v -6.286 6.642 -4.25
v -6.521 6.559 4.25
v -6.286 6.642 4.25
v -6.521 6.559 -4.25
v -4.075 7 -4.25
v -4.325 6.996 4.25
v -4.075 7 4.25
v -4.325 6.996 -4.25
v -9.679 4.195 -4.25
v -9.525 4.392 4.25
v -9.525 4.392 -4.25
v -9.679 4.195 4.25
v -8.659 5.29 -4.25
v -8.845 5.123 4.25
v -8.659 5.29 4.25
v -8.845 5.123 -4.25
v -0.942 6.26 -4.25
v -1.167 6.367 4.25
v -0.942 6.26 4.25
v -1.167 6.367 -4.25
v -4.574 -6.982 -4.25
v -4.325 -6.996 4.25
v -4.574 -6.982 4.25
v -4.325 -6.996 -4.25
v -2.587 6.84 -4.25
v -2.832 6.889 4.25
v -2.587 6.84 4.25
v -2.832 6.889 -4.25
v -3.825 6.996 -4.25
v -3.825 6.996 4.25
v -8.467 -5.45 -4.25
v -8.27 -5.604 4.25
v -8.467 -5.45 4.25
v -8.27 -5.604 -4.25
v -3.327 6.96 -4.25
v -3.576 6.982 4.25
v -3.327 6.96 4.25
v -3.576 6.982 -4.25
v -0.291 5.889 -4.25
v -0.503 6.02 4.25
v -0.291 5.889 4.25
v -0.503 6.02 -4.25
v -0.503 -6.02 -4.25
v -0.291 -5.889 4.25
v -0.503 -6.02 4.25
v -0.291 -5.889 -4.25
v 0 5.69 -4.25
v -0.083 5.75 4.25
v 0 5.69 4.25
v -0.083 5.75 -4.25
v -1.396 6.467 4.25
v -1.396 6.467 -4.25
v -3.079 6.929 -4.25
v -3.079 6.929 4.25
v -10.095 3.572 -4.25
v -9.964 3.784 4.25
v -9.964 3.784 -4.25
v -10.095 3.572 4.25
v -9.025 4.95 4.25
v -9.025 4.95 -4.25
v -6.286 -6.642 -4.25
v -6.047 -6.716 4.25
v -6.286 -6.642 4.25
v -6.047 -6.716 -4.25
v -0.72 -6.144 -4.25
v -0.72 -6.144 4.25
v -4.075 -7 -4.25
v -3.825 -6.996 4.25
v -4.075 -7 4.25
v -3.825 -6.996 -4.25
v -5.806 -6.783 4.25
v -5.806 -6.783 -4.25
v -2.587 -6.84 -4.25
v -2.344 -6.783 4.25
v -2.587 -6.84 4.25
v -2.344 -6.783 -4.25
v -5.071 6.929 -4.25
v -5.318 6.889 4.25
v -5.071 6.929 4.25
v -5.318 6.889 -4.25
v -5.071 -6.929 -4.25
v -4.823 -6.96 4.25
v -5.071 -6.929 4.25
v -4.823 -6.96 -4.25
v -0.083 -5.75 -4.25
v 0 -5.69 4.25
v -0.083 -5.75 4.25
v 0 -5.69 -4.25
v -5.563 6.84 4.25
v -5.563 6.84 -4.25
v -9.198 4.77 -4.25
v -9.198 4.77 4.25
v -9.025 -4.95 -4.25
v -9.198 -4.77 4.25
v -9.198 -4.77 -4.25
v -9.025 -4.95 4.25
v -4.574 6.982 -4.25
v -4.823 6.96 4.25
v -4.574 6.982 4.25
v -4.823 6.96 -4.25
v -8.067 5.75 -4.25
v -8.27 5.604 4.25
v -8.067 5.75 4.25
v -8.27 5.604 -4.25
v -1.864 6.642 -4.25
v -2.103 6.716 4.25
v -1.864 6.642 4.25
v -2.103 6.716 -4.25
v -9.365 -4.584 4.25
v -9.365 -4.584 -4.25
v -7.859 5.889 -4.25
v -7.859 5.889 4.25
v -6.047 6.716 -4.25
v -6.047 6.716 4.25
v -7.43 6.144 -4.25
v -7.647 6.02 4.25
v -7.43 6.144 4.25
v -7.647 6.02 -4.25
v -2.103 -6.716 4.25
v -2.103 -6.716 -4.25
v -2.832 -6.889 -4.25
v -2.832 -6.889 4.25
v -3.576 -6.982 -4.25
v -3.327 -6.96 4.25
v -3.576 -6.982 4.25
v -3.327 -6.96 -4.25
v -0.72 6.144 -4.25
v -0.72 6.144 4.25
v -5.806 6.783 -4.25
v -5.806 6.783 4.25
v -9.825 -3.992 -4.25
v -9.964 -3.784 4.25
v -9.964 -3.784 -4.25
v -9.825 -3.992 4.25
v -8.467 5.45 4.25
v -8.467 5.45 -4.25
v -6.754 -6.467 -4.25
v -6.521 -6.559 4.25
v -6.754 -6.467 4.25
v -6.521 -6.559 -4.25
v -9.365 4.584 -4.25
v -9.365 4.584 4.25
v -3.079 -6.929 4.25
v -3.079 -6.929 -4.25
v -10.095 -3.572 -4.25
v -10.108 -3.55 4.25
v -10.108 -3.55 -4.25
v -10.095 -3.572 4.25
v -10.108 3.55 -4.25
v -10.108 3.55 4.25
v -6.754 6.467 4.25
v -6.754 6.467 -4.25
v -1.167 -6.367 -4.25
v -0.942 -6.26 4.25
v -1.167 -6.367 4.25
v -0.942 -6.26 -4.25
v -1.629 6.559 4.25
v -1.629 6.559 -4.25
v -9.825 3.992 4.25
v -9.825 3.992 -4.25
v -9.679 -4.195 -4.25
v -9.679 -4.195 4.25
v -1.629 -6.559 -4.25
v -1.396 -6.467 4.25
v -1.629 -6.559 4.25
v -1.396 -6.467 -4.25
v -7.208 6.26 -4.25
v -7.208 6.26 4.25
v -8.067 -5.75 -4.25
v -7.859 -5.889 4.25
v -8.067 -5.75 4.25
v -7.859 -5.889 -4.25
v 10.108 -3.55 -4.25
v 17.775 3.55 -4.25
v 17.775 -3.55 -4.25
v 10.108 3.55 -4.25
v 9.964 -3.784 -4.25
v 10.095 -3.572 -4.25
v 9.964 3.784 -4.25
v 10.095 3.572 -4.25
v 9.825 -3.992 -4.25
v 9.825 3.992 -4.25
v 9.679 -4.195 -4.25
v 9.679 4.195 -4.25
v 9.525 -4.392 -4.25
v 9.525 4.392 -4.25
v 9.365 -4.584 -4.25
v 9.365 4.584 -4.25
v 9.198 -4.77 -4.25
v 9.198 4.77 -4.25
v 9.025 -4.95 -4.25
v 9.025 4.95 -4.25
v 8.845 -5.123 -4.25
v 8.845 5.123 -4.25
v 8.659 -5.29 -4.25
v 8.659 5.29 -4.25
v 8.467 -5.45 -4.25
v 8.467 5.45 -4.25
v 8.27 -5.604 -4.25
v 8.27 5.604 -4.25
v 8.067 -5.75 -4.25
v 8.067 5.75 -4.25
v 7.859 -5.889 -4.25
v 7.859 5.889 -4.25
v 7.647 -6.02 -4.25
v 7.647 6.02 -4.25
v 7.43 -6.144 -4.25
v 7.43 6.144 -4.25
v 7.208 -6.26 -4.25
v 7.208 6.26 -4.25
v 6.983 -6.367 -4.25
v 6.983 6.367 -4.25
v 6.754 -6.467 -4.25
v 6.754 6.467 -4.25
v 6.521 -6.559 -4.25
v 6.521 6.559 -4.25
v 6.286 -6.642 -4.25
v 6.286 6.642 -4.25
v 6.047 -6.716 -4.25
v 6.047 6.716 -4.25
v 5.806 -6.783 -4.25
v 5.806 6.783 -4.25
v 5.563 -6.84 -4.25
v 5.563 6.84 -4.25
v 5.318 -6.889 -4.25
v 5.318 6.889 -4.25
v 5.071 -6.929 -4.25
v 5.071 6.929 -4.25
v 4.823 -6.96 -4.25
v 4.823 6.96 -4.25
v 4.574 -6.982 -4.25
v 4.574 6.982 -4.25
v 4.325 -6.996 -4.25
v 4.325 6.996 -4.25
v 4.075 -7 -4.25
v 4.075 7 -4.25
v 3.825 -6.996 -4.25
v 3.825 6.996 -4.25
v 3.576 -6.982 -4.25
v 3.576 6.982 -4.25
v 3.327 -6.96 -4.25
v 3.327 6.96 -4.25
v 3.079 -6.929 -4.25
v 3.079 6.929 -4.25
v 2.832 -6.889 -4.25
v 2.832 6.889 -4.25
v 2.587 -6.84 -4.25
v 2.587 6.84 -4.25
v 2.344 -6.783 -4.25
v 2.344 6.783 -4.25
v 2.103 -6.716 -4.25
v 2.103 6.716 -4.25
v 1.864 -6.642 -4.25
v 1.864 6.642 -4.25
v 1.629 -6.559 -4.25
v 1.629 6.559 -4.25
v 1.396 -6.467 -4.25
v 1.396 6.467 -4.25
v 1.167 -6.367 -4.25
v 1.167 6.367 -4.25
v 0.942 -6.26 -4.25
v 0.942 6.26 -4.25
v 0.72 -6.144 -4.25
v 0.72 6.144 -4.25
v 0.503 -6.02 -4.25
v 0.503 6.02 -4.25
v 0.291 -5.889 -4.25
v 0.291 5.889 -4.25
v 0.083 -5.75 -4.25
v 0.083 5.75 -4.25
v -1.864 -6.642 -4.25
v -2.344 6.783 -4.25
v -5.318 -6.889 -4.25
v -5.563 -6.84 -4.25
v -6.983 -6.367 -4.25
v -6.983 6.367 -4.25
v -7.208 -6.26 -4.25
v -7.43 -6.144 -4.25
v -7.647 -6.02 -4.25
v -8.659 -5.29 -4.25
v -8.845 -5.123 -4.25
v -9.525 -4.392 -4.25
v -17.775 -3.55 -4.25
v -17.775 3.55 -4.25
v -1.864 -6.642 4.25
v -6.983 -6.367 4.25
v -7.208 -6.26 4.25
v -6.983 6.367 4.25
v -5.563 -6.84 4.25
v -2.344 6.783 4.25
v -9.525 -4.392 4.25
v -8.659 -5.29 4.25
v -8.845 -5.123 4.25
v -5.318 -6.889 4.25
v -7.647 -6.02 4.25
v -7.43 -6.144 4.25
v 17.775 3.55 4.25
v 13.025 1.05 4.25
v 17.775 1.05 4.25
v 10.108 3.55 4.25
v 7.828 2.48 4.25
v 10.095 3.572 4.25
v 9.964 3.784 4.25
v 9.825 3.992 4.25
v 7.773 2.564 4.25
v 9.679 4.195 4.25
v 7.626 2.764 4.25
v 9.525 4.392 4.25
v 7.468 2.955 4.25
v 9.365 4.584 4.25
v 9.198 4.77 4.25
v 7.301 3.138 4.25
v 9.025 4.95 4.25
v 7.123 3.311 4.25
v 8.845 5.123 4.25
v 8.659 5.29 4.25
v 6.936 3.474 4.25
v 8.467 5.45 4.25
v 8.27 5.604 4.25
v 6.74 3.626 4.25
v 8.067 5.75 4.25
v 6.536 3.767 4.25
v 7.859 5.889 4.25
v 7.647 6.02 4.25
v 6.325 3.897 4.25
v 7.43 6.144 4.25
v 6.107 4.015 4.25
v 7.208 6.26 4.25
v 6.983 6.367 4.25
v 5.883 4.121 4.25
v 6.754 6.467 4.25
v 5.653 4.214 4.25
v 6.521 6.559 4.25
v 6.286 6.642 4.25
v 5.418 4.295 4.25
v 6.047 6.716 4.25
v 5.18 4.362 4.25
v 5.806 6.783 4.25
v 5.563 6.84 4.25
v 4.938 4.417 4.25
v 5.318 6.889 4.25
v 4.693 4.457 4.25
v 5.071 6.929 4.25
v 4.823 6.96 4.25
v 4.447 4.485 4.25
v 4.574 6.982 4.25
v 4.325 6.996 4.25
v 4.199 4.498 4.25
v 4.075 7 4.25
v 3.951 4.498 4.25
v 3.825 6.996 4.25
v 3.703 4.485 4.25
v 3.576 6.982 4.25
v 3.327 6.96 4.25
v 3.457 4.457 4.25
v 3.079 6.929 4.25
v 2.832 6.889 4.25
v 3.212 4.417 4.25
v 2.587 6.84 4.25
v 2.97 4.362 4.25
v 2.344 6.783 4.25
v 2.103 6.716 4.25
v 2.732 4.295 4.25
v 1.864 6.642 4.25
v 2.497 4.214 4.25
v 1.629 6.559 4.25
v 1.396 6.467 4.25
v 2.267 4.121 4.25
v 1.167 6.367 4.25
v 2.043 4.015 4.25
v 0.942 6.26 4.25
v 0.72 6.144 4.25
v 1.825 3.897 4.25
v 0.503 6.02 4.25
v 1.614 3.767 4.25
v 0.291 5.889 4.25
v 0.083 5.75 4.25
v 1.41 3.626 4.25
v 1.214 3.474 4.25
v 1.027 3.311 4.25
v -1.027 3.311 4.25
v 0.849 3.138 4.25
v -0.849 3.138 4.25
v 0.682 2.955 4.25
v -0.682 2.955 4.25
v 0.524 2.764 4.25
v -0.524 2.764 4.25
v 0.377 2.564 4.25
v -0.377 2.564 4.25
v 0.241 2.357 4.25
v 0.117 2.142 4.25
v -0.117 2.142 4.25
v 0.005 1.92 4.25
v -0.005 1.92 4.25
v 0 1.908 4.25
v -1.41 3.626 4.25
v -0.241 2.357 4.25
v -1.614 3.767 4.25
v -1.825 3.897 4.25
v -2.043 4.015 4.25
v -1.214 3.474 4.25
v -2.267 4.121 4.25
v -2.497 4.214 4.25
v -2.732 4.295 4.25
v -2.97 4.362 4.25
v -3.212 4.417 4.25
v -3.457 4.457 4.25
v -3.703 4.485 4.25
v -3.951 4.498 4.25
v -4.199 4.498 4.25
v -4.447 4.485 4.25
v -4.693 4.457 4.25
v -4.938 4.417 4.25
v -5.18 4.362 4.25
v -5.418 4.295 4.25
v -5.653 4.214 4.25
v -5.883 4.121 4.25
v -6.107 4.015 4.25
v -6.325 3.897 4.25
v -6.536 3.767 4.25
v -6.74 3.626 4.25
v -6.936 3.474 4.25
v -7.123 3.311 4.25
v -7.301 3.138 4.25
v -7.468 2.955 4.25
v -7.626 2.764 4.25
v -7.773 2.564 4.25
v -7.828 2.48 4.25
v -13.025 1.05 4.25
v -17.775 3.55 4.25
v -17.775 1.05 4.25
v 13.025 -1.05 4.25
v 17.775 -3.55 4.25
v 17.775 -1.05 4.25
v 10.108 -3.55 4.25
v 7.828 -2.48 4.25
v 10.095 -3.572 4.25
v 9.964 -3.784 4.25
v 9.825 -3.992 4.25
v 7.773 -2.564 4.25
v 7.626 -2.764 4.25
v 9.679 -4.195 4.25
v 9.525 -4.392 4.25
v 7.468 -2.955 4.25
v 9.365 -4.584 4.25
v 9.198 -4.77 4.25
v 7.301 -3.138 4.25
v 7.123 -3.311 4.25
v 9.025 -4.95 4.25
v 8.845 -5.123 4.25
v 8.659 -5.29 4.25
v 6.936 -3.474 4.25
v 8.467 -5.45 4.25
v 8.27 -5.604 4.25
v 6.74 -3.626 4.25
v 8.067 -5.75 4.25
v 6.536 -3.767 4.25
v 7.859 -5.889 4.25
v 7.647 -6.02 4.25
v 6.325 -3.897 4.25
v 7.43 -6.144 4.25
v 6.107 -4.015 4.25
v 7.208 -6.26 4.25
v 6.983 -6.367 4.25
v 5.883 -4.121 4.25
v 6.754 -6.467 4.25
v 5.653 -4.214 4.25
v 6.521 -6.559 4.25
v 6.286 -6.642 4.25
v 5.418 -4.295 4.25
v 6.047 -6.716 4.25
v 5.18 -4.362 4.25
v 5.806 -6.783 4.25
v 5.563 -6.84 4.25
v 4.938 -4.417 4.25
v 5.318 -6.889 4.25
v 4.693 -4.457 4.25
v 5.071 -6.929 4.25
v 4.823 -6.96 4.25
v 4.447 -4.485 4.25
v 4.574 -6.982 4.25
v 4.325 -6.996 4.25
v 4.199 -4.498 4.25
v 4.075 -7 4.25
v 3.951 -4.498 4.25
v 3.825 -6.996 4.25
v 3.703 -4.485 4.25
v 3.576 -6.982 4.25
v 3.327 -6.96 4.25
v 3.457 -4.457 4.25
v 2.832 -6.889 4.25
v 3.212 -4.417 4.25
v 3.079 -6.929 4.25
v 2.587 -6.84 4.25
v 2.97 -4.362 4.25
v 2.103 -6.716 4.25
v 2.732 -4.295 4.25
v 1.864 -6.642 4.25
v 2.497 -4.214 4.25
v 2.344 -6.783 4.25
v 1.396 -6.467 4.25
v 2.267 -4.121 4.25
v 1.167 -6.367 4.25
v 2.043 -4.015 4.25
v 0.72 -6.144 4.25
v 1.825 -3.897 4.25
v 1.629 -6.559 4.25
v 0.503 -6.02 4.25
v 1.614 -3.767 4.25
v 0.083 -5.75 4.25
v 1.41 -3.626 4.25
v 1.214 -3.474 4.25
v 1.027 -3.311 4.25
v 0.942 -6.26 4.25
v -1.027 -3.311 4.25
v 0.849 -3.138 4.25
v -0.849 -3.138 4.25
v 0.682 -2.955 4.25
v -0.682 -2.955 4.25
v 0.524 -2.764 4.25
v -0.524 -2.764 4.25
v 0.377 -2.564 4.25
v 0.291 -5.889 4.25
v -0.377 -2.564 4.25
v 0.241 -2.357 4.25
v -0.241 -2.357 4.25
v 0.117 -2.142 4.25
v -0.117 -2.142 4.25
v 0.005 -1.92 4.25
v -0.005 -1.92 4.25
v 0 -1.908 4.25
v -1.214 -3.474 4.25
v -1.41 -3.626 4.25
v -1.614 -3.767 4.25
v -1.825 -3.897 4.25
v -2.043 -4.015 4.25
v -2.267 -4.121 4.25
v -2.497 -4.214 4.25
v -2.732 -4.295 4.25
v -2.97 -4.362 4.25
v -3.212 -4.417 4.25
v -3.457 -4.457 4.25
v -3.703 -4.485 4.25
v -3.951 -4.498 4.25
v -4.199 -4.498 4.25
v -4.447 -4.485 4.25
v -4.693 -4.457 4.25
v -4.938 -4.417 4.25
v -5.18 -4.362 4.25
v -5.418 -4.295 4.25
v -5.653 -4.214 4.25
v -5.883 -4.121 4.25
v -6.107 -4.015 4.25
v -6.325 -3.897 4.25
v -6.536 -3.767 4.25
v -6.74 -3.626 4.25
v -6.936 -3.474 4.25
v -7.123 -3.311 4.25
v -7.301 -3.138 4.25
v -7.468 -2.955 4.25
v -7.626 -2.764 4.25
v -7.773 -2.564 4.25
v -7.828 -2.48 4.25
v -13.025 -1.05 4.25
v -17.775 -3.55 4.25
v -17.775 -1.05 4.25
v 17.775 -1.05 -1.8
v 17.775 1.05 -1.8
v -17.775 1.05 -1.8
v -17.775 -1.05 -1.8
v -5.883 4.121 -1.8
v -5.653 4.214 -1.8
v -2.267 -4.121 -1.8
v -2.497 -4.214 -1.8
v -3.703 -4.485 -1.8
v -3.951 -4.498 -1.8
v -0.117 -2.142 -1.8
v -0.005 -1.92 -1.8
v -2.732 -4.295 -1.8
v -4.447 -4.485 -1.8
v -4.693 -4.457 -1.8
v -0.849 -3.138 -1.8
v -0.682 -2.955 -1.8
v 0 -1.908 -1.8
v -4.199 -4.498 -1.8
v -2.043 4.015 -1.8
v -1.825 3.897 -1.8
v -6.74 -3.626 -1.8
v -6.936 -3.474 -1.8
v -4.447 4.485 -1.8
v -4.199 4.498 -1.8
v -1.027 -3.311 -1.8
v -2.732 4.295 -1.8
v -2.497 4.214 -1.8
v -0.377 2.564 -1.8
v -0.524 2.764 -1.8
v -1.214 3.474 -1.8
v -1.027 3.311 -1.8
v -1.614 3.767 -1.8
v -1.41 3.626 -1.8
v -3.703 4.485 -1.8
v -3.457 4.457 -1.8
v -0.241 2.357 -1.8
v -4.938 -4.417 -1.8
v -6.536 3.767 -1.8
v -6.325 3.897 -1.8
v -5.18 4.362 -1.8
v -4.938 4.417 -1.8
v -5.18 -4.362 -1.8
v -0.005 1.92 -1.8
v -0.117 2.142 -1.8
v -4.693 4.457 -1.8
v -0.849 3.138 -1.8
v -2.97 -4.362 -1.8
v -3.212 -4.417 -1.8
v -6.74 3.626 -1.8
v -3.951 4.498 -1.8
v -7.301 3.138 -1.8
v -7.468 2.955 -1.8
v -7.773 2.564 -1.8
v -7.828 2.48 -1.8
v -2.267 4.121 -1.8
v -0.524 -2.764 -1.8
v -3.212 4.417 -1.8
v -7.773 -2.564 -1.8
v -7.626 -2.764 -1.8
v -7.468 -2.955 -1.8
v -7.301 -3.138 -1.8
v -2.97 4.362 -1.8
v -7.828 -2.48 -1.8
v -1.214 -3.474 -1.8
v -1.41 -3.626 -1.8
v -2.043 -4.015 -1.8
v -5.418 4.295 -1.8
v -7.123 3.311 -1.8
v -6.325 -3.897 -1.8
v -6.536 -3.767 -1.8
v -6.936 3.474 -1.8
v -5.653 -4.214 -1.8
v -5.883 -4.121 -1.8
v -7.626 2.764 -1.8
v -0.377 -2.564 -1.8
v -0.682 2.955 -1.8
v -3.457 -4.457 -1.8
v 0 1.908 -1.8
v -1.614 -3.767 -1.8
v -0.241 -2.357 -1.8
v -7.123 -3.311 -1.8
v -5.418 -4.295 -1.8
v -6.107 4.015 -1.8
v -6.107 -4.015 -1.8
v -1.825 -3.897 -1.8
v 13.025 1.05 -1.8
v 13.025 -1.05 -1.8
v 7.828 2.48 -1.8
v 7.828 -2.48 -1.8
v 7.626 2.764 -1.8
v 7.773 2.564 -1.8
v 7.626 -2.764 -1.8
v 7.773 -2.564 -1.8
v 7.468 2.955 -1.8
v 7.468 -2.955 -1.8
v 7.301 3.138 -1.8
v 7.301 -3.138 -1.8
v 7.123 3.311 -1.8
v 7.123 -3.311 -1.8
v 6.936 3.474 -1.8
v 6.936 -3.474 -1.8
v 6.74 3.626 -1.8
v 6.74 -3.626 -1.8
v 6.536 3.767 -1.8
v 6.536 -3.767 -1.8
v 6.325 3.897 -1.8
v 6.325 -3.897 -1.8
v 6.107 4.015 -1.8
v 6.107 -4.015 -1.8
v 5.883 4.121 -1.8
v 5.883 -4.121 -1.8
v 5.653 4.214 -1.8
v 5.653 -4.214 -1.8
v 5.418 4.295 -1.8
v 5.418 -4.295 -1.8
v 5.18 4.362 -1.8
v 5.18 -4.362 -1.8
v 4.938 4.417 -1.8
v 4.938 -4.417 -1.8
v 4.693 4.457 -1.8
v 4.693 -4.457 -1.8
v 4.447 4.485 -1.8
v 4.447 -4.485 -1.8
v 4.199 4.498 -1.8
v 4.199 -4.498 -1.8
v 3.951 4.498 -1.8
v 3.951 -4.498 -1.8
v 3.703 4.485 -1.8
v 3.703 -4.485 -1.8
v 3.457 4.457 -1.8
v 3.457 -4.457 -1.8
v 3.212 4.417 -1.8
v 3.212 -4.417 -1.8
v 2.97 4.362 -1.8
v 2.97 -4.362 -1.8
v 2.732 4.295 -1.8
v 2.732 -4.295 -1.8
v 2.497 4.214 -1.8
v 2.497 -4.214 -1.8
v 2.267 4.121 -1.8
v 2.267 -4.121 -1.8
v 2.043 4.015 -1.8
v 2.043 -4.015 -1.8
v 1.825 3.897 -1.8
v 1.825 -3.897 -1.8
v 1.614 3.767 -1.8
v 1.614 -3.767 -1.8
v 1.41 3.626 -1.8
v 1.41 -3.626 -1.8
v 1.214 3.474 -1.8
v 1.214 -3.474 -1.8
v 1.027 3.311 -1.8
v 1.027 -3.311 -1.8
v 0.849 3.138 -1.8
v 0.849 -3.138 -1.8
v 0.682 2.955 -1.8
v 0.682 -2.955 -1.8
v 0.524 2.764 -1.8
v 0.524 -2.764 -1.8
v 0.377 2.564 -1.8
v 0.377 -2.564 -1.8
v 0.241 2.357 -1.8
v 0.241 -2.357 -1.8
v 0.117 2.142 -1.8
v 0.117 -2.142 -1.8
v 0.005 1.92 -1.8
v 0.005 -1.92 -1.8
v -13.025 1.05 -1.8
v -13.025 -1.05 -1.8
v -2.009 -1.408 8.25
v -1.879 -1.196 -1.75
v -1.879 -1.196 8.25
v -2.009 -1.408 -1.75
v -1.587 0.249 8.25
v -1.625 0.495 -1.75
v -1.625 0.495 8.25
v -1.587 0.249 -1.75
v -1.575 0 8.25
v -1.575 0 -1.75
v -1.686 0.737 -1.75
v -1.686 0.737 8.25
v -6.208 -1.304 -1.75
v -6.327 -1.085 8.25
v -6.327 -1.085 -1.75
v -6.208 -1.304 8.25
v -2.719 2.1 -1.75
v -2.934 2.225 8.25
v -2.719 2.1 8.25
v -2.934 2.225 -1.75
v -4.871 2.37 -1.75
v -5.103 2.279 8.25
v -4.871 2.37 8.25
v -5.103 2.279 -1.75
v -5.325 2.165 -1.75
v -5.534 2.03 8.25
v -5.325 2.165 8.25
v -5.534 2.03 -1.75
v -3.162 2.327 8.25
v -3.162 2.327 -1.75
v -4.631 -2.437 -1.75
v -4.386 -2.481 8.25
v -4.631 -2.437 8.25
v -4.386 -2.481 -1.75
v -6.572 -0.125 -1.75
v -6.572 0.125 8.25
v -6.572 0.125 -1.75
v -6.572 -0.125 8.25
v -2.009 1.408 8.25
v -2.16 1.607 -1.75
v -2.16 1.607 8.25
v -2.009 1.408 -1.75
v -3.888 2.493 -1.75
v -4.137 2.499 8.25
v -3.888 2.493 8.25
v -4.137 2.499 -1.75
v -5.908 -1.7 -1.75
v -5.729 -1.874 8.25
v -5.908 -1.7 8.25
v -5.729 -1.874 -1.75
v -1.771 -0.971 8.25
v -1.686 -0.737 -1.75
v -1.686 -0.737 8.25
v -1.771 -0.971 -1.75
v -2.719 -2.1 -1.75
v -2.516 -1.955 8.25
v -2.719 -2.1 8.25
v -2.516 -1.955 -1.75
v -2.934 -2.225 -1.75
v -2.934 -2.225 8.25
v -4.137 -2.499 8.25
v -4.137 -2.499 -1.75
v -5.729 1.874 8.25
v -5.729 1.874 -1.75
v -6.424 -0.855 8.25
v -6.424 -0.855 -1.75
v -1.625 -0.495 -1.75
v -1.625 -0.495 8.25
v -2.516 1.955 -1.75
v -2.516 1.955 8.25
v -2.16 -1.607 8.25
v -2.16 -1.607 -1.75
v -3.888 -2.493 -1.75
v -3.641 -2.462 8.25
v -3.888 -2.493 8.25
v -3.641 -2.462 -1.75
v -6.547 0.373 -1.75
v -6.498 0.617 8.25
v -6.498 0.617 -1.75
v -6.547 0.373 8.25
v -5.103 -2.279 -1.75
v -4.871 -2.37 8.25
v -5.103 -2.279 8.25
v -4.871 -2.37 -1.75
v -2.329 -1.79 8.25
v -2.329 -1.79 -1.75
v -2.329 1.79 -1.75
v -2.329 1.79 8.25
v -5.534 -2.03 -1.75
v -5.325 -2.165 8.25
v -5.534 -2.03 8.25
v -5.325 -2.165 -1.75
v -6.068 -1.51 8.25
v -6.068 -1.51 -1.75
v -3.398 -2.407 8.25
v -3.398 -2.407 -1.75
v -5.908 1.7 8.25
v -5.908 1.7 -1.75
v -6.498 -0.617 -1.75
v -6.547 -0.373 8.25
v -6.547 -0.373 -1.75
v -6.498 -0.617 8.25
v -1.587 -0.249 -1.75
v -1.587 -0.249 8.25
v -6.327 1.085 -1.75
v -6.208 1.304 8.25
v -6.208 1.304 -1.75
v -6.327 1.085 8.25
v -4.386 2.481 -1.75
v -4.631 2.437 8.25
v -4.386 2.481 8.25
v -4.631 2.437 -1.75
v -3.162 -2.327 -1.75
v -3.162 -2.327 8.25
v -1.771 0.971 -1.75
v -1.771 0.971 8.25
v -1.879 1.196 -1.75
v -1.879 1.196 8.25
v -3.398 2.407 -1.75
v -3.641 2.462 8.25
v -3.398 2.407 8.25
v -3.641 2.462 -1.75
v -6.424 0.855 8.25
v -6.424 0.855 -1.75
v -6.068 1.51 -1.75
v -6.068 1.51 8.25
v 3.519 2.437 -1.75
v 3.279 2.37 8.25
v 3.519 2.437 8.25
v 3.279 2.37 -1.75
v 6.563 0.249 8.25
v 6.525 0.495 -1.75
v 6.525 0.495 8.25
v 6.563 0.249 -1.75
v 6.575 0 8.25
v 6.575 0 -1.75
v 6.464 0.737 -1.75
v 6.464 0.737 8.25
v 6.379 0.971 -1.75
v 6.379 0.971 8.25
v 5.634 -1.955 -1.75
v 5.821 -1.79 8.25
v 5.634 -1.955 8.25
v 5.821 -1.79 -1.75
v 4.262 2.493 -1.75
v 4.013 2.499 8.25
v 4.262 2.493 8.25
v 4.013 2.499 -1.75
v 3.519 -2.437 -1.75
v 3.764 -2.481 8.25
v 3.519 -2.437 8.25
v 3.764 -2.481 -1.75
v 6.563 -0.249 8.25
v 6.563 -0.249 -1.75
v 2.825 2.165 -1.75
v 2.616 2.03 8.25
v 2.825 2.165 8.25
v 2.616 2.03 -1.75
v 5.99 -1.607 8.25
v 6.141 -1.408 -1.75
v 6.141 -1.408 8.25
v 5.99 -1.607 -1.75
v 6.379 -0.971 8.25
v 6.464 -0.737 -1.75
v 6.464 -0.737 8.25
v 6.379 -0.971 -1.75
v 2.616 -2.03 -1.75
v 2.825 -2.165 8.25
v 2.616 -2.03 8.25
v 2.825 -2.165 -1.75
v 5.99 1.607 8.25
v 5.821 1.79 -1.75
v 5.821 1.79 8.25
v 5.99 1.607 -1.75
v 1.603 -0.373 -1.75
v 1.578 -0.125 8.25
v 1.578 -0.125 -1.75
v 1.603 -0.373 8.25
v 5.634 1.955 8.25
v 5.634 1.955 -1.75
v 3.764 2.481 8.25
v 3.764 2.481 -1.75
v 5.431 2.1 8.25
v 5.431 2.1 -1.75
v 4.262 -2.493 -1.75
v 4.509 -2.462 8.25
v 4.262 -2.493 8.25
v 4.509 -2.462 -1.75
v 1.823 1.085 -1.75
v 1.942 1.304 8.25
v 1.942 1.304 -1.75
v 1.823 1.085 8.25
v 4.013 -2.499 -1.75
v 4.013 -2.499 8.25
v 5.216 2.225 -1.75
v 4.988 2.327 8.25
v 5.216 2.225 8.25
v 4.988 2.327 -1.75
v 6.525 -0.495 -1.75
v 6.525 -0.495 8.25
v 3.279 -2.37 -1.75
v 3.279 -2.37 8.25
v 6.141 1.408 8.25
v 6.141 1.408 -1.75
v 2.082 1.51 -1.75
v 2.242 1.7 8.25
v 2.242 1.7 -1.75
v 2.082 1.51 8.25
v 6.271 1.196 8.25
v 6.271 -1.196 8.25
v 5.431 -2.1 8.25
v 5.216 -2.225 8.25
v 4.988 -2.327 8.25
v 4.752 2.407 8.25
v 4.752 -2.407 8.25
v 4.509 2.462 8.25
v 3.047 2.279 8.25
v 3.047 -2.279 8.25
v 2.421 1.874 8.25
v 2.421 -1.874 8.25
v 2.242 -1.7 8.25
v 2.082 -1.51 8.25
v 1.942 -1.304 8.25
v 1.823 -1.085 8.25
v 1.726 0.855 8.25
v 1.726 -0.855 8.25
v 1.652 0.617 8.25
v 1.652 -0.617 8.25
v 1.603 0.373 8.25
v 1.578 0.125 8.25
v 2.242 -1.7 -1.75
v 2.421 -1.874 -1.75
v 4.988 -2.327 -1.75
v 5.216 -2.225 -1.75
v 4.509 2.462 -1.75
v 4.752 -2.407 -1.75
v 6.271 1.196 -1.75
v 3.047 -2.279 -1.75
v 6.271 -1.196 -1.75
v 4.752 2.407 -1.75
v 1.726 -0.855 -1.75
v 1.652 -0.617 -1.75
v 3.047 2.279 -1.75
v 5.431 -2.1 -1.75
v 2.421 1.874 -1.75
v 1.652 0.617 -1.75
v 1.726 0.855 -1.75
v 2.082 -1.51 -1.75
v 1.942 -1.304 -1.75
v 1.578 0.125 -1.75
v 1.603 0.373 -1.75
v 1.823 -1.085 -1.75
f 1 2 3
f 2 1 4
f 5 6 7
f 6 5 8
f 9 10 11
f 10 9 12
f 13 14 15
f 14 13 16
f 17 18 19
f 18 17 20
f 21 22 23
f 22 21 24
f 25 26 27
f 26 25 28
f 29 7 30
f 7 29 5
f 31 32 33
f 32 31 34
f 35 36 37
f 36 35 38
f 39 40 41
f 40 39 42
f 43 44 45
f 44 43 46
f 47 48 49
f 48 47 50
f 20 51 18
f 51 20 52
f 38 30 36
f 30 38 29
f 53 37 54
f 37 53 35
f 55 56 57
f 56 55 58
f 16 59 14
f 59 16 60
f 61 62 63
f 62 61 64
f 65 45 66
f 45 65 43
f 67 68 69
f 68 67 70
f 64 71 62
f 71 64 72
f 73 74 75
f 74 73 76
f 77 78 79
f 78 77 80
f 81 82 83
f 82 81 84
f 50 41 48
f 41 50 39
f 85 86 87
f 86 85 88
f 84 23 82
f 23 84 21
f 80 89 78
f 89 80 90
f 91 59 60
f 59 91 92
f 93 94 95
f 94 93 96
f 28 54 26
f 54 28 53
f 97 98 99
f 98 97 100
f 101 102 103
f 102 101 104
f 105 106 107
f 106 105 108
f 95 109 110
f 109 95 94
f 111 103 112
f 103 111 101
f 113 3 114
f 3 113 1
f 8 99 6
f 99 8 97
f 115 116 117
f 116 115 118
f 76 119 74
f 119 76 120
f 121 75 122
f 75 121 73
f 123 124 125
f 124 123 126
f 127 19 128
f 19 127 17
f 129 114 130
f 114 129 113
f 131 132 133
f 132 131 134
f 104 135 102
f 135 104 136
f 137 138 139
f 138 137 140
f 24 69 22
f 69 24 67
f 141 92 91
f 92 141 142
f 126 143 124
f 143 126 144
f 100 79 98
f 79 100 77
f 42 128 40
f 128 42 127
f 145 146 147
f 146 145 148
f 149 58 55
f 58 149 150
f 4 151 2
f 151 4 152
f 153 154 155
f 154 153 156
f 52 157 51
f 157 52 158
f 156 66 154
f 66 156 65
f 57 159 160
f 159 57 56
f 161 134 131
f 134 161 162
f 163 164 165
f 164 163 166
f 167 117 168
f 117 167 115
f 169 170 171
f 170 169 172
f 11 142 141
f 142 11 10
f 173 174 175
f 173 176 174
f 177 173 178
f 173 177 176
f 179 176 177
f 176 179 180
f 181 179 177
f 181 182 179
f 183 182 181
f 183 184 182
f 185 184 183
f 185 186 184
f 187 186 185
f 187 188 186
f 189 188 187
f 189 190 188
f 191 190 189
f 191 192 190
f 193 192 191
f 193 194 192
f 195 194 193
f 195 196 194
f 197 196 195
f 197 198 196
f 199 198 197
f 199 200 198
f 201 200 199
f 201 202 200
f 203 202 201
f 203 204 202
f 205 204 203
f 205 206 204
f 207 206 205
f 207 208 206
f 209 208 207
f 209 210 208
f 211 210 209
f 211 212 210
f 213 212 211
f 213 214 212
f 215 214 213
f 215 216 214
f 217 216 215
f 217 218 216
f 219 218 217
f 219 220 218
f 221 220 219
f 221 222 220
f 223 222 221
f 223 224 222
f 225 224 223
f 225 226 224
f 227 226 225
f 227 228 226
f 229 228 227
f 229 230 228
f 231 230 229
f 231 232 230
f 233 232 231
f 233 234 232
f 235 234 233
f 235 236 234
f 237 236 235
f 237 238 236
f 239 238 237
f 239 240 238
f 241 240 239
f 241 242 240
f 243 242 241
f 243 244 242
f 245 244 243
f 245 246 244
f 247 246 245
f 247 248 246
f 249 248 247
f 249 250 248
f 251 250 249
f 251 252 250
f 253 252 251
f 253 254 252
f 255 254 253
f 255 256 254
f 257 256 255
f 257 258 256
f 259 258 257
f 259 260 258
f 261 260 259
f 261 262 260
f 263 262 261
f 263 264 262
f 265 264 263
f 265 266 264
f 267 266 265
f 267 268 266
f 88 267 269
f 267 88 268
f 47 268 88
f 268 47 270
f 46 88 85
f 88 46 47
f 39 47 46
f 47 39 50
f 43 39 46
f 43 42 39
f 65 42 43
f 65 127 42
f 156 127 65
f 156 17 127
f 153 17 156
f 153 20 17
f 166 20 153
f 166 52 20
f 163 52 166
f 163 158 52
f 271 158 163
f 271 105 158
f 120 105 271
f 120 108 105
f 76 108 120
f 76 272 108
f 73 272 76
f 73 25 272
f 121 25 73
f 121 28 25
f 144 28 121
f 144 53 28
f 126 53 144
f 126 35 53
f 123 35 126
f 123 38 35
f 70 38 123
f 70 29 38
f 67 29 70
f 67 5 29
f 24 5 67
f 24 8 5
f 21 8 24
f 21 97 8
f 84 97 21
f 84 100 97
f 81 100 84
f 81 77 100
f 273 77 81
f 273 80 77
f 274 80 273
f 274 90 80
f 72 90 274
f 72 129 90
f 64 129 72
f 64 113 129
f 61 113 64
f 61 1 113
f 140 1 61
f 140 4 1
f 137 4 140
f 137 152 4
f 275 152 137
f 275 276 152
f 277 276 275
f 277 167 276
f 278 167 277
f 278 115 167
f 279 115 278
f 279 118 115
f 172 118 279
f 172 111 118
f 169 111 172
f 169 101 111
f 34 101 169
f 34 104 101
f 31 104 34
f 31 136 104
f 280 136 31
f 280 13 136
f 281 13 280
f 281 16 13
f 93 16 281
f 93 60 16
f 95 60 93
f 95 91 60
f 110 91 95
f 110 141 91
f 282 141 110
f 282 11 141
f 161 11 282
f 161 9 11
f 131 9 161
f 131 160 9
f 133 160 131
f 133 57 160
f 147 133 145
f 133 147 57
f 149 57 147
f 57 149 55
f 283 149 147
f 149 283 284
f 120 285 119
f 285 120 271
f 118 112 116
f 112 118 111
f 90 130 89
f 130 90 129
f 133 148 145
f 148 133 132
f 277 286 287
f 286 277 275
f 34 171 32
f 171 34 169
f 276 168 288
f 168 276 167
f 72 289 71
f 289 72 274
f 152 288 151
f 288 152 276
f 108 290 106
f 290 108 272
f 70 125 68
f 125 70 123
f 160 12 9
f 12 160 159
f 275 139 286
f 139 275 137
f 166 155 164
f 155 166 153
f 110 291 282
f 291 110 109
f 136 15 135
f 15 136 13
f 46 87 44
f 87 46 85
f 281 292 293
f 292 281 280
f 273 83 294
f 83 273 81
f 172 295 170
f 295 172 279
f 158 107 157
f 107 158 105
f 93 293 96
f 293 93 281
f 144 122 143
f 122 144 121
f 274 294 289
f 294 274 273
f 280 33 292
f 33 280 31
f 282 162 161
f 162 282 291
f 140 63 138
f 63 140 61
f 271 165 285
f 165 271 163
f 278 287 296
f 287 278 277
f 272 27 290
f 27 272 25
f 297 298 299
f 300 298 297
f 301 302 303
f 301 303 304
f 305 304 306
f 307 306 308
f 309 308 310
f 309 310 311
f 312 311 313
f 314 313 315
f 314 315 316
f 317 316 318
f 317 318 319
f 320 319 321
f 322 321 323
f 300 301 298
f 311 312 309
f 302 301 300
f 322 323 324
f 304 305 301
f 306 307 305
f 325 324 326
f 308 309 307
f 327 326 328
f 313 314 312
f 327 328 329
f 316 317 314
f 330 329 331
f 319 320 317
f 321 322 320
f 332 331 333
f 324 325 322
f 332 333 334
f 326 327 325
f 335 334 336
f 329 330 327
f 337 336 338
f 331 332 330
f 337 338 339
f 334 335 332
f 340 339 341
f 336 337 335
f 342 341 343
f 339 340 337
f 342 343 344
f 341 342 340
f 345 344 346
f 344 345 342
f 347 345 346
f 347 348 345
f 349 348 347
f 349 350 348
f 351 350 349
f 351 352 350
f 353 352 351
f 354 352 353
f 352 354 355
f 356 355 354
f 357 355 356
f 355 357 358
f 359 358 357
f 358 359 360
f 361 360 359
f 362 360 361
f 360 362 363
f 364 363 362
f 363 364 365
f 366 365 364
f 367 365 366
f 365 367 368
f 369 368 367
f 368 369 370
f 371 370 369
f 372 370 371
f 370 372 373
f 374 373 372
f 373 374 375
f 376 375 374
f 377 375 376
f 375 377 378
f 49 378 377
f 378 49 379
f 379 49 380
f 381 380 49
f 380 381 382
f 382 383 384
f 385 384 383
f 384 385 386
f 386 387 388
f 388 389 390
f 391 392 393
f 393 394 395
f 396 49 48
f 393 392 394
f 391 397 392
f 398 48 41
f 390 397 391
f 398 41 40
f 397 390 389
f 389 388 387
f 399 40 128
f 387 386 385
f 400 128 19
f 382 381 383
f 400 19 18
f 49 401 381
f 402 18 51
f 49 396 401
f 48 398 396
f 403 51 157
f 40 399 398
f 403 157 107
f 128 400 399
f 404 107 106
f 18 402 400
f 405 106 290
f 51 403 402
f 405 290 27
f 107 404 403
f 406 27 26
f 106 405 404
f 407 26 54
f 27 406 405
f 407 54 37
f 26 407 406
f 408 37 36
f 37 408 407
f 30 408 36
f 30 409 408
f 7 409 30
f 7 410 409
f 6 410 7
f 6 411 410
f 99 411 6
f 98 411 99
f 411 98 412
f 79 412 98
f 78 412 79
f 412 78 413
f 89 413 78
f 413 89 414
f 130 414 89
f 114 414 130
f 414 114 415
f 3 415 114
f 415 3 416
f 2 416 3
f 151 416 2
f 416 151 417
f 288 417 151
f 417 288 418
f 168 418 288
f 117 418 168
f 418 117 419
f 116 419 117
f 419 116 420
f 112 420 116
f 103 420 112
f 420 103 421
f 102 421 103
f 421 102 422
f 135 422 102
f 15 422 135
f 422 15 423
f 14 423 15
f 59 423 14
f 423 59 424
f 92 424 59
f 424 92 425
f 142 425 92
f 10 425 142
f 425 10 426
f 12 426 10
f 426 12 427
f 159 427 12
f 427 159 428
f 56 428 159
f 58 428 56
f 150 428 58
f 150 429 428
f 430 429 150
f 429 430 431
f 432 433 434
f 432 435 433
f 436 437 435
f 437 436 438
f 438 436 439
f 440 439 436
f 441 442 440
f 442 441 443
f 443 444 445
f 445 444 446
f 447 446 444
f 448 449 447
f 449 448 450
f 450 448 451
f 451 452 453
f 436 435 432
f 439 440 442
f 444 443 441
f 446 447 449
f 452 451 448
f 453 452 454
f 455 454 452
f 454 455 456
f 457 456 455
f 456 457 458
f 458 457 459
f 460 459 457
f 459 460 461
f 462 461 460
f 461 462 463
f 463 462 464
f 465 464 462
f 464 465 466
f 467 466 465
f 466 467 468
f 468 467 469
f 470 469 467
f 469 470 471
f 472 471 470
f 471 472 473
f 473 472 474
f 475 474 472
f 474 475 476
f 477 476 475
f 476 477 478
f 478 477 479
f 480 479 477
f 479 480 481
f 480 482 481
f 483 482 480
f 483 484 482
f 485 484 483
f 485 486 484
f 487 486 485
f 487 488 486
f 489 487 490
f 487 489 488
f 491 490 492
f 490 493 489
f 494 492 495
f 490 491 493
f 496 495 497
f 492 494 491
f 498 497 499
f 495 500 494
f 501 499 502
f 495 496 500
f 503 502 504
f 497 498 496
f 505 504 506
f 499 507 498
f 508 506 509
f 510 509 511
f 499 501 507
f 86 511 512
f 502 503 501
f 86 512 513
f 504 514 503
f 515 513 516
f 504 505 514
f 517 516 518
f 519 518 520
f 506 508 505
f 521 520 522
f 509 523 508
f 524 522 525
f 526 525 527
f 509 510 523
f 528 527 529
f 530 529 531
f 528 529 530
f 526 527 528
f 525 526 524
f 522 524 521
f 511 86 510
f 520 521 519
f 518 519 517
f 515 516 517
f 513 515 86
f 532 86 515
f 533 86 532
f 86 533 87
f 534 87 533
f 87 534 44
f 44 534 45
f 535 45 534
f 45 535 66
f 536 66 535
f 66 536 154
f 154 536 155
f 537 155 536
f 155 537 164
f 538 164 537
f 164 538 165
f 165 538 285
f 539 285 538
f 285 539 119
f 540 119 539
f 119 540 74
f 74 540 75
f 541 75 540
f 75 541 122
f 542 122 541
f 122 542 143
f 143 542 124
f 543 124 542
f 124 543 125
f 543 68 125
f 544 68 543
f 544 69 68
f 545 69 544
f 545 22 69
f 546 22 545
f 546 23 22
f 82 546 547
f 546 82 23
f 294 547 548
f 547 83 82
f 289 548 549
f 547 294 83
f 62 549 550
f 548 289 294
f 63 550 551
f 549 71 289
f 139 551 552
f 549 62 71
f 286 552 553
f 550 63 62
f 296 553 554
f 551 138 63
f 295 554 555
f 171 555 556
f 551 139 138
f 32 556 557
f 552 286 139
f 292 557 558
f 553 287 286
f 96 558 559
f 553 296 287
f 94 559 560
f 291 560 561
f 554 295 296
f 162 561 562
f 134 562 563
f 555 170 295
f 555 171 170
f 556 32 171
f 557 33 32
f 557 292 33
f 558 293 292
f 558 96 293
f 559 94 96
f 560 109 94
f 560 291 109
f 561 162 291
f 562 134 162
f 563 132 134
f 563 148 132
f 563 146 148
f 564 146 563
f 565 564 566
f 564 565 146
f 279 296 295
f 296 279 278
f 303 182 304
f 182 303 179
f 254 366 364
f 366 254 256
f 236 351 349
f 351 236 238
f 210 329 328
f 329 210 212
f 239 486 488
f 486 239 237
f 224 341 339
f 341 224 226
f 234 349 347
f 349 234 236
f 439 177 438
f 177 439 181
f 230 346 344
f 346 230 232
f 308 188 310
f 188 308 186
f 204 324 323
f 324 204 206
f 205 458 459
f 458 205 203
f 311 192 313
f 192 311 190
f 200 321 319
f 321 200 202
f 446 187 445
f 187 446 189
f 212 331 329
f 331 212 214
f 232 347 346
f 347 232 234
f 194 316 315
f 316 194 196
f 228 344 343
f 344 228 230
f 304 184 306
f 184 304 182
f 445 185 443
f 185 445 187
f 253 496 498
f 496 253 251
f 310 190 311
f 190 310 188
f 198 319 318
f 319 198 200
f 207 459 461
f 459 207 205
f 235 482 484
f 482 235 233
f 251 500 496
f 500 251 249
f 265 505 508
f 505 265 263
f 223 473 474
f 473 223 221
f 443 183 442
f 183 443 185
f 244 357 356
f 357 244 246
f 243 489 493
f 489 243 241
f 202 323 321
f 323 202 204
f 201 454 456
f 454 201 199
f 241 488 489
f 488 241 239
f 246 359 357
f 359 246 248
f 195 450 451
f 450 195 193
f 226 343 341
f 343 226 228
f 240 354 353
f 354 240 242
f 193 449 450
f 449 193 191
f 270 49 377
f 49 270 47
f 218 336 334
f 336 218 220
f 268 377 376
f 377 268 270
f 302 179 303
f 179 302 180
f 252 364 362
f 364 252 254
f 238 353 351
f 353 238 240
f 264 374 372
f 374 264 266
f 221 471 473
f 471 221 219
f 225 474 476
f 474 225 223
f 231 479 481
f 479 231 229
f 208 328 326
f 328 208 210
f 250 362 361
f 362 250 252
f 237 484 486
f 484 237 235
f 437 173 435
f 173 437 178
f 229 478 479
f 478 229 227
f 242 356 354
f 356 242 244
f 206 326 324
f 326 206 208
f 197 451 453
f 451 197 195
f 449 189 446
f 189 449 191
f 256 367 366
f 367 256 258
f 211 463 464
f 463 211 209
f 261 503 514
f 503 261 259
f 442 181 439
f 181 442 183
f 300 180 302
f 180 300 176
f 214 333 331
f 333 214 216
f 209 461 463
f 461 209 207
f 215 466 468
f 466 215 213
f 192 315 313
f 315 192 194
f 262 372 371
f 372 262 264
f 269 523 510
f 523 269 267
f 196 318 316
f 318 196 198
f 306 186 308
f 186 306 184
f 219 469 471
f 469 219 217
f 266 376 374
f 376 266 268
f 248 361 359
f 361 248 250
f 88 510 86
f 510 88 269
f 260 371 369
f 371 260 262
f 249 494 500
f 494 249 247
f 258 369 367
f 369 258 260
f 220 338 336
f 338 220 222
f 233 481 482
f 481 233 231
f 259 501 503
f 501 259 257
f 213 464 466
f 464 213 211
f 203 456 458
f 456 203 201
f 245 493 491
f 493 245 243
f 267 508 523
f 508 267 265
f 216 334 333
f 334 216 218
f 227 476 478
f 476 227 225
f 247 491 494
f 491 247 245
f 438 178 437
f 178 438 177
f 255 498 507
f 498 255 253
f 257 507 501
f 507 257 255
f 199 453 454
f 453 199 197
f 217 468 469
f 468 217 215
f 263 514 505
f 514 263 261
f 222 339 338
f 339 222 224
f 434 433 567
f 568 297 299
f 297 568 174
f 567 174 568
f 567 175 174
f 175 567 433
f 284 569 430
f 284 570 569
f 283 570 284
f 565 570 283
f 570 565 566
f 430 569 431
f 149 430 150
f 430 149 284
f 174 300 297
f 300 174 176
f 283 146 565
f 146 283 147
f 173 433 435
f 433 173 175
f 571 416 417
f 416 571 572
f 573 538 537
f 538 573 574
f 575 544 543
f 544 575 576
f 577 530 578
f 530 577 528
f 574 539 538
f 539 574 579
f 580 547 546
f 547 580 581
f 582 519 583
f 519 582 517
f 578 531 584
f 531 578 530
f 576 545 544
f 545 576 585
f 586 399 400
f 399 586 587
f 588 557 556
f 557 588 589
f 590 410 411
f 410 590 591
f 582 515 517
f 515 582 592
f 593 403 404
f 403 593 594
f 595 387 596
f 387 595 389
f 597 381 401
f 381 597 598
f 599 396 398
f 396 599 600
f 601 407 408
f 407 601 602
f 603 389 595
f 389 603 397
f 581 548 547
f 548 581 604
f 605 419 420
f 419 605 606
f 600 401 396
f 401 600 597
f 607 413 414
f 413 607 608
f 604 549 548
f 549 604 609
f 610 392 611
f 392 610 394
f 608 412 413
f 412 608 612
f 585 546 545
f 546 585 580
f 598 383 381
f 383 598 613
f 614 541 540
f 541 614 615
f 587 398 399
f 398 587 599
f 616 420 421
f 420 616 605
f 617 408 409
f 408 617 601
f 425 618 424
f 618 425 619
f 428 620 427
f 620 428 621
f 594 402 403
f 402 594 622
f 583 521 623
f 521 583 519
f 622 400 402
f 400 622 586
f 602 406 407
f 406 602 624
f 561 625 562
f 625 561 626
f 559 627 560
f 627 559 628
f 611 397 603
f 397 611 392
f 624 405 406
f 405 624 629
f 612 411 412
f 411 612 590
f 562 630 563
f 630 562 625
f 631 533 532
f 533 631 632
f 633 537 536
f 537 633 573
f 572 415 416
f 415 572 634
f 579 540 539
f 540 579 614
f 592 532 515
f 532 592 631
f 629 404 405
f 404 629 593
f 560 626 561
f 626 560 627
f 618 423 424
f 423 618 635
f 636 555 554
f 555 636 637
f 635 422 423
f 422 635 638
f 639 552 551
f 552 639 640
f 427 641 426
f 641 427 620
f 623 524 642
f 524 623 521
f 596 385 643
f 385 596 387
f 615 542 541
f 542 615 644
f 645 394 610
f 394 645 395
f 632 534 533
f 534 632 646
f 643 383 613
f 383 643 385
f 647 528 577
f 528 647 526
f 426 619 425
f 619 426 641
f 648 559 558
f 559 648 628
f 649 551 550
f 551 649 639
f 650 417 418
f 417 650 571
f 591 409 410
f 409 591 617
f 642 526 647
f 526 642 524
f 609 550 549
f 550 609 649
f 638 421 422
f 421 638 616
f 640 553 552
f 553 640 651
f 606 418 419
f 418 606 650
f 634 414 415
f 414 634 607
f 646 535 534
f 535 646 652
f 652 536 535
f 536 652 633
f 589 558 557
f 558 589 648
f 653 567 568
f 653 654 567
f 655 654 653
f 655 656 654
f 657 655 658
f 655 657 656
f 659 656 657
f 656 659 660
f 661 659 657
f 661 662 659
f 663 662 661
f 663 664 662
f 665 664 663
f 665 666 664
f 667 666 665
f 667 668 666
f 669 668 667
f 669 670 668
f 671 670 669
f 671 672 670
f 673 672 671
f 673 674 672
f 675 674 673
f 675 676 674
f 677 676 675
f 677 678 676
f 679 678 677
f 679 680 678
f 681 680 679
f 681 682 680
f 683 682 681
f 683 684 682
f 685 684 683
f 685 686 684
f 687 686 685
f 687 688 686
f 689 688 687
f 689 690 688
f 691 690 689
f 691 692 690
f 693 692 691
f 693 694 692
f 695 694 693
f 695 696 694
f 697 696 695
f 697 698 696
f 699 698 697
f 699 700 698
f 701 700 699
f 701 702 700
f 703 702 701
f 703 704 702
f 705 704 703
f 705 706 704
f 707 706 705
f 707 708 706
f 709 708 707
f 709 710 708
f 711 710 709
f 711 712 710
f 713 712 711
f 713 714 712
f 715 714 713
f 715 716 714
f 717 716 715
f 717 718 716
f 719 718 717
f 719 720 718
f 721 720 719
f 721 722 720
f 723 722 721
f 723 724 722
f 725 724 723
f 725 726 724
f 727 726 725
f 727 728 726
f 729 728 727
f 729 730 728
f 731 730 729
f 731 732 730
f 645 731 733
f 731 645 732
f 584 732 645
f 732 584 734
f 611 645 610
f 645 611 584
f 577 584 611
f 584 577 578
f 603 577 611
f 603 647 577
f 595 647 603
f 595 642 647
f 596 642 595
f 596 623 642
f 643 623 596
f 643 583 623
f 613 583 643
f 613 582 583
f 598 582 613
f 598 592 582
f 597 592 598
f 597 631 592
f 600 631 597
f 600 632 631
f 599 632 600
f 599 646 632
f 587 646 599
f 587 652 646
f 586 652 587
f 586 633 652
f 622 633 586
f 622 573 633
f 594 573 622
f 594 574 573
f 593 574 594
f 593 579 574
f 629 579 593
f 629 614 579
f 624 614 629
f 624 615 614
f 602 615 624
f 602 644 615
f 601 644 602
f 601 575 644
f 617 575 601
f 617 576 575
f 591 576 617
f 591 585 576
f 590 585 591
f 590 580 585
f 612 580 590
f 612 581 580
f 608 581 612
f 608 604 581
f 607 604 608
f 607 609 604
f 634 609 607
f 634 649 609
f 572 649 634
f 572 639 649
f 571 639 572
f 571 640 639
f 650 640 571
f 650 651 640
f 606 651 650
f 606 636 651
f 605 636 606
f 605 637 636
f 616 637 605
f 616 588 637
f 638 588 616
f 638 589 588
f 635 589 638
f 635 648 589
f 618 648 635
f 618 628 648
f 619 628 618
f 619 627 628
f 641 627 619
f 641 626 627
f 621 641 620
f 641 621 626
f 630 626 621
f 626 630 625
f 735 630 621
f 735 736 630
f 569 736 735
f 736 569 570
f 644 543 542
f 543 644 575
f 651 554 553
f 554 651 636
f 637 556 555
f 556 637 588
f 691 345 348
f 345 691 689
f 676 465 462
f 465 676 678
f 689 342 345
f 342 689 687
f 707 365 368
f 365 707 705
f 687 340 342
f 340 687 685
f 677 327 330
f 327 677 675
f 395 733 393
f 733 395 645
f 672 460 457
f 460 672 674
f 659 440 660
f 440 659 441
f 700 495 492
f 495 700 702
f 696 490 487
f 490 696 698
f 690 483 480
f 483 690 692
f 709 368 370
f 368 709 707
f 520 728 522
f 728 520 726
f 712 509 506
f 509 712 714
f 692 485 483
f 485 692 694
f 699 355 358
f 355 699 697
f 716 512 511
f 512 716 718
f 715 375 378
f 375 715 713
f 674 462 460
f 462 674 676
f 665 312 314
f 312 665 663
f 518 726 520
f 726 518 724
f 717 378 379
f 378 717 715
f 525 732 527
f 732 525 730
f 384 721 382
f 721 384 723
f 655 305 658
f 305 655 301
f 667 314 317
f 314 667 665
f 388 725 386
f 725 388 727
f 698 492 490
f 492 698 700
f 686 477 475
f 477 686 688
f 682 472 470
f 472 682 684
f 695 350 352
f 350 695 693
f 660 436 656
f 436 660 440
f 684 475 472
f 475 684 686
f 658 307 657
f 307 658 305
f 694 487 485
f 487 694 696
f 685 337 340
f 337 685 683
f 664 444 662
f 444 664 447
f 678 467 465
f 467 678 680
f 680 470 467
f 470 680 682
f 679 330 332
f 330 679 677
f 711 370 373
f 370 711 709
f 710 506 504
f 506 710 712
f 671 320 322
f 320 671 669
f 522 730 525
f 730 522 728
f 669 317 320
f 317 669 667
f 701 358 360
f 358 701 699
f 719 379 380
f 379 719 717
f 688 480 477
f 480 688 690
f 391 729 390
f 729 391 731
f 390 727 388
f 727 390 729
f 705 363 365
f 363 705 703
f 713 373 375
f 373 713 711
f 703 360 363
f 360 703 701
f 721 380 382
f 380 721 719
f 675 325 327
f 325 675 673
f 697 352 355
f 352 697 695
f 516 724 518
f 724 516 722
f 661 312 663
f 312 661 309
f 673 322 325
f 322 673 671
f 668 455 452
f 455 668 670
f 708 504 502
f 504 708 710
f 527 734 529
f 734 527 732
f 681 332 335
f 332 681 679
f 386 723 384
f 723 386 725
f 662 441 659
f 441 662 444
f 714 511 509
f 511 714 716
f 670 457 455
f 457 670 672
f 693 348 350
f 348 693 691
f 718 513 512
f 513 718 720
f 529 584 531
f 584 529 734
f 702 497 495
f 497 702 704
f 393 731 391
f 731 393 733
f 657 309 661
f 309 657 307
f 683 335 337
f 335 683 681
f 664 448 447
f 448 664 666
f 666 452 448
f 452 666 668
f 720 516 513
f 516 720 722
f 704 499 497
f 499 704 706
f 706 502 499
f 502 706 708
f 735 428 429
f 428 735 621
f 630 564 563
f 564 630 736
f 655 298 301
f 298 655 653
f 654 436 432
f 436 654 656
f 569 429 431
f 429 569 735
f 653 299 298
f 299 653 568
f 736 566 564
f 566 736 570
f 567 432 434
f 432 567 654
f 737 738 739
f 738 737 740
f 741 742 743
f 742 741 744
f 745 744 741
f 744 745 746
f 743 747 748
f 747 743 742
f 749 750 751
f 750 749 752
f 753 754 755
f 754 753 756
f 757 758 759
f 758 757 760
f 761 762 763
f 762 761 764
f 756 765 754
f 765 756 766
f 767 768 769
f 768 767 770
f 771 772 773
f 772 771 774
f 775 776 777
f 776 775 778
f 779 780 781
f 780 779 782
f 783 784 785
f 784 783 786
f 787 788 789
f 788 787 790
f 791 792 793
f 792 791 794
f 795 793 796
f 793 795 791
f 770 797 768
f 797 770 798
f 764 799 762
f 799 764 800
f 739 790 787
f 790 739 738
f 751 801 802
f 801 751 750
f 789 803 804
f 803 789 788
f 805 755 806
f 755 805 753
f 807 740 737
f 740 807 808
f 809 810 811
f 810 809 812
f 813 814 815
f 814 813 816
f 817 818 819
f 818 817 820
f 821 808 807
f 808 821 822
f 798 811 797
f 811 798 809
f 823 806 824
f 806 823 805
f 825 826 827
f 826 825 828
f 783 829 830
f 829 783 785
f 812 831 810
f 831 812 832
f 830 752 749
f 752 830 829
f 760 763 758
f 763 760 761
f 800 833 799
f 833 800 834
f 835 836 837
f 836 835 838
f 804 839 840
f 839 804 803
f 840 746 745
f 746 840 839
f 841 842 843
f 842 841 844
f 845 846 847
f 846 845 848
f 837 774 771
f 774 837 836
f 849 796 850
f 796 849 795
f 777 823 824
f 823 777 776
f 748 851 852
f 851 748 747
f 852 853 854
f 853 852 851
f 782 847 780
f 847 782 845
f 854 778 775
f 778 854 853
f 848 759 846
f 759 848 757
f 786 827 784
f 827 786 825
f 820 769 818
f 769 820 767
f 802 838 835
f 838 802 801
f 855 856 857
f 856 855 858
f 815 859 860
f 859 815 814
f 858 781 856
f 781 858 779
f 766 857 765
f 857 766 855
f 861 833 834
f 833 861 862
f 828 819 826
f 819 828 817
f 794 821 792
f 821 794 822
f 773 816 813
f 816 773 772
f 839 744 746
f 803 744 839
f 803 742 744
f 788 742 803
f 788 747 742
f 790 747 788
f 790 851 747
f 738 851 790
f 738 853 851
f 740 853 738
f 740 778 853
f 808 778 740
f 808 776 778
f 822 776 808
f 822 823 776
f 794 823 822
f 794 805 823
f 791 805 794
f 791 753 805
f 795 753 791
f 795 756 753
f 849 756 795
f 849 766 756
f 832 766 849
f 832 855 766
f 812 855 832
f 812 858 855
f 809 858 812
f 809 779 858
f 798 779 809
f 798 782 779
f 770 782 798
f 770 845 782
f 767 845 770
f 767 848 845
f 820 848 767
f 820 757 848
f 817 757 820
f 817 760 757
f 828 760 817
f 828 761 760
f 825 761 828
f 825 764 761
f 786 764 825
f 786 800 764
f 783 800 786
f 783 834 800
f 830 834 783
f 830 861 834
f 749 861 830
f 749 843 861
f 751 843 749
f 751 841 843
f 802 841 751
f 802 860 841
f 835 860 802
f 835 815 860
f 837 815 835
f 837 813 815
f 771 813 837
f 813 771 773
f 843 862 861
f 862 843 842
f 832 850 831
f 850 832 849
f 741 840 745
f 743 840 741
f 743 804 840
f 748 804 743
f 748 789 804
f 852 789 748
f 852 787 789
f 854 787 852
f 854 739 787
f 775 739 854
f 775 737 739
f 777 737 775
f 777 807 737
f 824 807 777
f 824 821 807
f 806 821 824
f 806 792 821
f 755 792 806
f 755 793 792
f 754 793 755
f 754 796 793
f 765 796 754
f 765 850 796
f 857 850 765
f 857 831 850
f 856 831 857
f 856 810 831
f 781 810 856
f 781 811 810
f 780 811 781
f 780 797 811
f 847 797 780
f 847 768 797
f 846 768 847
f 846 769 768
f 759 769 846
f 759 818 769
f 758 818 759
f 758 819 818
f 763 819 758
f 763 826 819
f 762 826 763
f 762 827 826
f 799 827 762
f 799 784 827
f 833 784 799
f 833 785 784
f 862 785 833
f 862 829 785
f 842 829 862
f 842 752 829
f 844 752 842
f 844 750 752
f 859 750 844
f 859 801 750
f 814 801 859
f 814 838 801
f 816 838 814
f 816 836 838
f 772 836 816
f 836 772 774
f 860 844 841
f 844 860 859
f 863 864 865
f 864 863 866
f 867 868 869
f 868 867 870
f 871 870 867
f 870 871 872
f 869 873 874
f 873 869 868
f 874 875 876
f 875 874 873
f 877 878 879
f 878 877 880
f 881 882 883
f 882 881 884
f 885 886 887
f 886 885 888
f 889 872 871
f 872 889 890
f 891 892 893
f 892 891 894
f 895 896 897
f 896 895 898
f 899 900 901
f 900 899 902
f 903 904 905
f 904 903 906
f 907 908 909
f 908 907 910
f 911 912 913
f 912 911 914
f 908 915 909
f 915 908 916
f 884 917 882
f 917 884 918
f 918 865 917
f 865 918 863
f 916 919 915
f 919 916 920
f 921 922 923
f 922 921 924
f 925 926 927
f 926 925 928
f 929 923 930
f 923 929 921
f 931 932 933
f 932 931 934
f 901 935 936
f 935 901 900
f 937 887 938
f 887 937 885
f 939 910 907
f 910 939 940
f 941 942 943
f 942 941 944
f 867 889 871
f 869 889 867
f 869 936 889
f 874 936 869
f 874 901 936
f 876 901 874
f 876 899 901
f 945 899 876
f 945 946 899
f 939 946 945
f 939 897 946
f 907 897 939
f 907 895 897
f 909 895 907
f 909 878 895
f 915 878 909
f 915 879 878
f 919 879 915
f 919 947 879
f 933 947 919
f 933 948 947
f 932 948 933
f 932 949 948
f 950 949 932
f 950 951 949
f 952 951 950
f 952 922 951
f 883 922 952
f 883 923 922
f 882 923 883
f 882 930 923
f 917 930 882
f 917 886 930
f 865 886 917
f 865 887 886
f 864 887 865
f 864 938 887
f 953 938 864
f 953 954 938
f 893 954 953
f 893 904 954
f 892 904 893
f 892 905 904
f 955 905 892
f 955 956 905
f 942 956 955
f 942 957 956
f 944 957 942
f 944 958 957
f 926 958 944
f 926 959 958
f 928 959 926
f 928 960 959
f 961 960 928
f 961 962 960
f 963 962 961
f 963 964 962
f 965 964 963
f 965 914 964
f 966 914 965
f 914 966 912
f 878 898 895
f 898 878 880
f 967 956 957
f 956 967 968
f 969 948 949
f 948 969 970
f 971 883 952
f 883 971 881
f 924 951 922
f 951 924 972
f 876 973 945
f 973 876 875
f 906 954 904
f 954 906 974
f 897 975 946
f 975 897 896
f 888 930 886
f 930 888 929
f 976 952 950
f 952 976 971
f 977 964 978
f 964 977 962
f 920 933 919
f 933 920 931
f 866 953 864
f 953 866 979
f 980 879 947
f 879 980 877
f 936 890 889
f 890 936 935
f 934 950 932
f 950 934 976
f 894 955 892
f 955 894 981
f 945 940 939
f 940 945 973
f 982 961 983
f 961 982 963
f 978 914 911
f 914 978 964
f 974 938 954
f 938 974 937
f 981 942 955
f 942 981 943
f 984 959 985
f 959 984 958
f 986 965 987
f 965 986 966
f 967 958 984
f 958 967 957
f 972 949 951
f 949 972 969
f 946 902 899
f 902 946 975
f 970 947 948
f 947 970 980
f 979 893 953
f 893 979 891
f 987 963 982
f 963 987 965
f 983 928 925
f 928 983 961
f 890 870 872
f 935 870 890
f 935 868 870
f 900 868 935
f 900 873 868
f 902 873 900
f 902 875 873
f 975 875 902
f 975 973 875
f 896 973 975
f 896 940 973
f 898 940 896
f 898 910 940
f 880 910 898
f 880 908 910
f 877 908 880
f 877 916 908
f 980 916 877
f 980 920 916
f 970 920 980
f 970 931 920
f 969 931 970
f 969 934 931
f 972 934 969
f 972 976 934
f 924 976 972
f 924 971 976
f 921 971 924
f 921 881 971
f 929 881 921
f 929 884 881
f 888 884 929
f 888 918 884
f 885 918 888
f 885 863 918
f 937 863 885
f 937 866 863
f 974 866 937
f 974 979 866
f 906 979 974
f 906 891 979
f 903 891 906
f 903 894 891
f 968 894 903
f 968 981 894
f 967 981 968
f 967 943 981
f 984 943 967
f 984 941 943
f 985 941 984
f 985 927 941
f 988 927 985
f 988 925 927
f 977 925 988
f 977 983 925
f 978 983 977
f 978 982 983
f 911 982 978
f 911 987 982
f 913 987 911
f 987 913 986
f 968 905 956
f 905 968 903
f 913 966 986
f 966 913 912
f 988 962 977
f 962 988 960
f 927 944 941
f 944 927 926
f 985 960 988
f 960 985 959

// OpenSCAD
$fs = 0.25;
$fa = 0.25;

//---------------------------------------------------------------------------------------------------- 
// CloverPlus v3 belt clip by pbmax (mpeterson333/@/gmail.com)
//---------------------------------------------------------------------------------------------------- 
// This part is designed to connect 2 ends of a GT2 timing belt together and hold them tensioned.
// It sort of works.. maybe..
//---------------------------------------------------------------------------------------------------- 

cloverplus_v3_belt_clip();

module cloverplus_v3_belt_clip()
{

  belt_channel_w = 2.1;
  belt_channel_l = 7;
  belt_t = 1.5;
  belt_extra = 0.5;
  
  loop_d = 5;
  loop_h = 10;
  loop_to_channel_offset = loop_d*0.5+belt_channel_w*2;
  loop_to_loop_offset = loop_d+belt_channel_w*1.5;
  
  wall_h = 6;
  
  clip_t = 2.5;
  clip_h = 6;
  
  block_w = belt_channel_w + clip_t*2;
  block_h = clip_h+clip_t;
  block_l = belt_channel_l*2+loop_to_channel_offset*2 + loop_to_loop_offset;
  mid_inner_d = loop_d+(belt_t+belt_extra)*2;
  mid_outer_d = mid_inner_d+clip_t*2;
  
  ff = 0.1;
  
  difference()
  {
    union()
    {
      // Main block
      cube([block_l, block_w, block_h], center=true);
      // Middle cylinders
      for(i=[-1,1])
        translate([i*loop_to_loop_offset*0.5, 0, 0])
        {
          cylinder(h=block_h, d=mid_outer_d, center=true);
          translate([0, 0, -block_h*0.5+clip_h*0.5+clip_t])
            cylinder(h=clip_h, d=loop_d, center=true);
        }
    }
    // Belt channels around loop pegs
    for(i=[-1,1])
      translate([i*loop_to_loop_offset*0.5, 0, clip_t])
        cylinder(h=block_h+ff, d=mid_inner_d, center=true);
    // Straight Belt channel
    translate([0, 0, clip_t])
      cube([block_l+ff, belt_channel_w, block_h+ff], center=true);
    // Make channels smoother for easier insertion
    for(i=[-1,1])
      hull()
      {
        translate([i*(belt_channel_l*0.25+loop_to_loop_offset*0.5+loop_to_channel_offset), 
                   0, 
                   clip_h*0.5-block_h*0.5+clip_t])
          cube([1, belt_channel_w, clip_h+ff], center=true);
        translate([i*(loop_to_loop_offset*0.5), 0, clip_h*0.5-block_h*0.5+clip_t])
          cube([1, mid_inner_d*0.75, clip_h+ff], center=true);
      }
  }
  
  // Loop pegs
  for(i=[-1,1])
    translate([i*loop_to_loop_offset*0.5, 0, -block_h*0.5+loop_h*0.5+clip_t])
      cylinder(h=loop_h, d=loop_d, center=true);
}
